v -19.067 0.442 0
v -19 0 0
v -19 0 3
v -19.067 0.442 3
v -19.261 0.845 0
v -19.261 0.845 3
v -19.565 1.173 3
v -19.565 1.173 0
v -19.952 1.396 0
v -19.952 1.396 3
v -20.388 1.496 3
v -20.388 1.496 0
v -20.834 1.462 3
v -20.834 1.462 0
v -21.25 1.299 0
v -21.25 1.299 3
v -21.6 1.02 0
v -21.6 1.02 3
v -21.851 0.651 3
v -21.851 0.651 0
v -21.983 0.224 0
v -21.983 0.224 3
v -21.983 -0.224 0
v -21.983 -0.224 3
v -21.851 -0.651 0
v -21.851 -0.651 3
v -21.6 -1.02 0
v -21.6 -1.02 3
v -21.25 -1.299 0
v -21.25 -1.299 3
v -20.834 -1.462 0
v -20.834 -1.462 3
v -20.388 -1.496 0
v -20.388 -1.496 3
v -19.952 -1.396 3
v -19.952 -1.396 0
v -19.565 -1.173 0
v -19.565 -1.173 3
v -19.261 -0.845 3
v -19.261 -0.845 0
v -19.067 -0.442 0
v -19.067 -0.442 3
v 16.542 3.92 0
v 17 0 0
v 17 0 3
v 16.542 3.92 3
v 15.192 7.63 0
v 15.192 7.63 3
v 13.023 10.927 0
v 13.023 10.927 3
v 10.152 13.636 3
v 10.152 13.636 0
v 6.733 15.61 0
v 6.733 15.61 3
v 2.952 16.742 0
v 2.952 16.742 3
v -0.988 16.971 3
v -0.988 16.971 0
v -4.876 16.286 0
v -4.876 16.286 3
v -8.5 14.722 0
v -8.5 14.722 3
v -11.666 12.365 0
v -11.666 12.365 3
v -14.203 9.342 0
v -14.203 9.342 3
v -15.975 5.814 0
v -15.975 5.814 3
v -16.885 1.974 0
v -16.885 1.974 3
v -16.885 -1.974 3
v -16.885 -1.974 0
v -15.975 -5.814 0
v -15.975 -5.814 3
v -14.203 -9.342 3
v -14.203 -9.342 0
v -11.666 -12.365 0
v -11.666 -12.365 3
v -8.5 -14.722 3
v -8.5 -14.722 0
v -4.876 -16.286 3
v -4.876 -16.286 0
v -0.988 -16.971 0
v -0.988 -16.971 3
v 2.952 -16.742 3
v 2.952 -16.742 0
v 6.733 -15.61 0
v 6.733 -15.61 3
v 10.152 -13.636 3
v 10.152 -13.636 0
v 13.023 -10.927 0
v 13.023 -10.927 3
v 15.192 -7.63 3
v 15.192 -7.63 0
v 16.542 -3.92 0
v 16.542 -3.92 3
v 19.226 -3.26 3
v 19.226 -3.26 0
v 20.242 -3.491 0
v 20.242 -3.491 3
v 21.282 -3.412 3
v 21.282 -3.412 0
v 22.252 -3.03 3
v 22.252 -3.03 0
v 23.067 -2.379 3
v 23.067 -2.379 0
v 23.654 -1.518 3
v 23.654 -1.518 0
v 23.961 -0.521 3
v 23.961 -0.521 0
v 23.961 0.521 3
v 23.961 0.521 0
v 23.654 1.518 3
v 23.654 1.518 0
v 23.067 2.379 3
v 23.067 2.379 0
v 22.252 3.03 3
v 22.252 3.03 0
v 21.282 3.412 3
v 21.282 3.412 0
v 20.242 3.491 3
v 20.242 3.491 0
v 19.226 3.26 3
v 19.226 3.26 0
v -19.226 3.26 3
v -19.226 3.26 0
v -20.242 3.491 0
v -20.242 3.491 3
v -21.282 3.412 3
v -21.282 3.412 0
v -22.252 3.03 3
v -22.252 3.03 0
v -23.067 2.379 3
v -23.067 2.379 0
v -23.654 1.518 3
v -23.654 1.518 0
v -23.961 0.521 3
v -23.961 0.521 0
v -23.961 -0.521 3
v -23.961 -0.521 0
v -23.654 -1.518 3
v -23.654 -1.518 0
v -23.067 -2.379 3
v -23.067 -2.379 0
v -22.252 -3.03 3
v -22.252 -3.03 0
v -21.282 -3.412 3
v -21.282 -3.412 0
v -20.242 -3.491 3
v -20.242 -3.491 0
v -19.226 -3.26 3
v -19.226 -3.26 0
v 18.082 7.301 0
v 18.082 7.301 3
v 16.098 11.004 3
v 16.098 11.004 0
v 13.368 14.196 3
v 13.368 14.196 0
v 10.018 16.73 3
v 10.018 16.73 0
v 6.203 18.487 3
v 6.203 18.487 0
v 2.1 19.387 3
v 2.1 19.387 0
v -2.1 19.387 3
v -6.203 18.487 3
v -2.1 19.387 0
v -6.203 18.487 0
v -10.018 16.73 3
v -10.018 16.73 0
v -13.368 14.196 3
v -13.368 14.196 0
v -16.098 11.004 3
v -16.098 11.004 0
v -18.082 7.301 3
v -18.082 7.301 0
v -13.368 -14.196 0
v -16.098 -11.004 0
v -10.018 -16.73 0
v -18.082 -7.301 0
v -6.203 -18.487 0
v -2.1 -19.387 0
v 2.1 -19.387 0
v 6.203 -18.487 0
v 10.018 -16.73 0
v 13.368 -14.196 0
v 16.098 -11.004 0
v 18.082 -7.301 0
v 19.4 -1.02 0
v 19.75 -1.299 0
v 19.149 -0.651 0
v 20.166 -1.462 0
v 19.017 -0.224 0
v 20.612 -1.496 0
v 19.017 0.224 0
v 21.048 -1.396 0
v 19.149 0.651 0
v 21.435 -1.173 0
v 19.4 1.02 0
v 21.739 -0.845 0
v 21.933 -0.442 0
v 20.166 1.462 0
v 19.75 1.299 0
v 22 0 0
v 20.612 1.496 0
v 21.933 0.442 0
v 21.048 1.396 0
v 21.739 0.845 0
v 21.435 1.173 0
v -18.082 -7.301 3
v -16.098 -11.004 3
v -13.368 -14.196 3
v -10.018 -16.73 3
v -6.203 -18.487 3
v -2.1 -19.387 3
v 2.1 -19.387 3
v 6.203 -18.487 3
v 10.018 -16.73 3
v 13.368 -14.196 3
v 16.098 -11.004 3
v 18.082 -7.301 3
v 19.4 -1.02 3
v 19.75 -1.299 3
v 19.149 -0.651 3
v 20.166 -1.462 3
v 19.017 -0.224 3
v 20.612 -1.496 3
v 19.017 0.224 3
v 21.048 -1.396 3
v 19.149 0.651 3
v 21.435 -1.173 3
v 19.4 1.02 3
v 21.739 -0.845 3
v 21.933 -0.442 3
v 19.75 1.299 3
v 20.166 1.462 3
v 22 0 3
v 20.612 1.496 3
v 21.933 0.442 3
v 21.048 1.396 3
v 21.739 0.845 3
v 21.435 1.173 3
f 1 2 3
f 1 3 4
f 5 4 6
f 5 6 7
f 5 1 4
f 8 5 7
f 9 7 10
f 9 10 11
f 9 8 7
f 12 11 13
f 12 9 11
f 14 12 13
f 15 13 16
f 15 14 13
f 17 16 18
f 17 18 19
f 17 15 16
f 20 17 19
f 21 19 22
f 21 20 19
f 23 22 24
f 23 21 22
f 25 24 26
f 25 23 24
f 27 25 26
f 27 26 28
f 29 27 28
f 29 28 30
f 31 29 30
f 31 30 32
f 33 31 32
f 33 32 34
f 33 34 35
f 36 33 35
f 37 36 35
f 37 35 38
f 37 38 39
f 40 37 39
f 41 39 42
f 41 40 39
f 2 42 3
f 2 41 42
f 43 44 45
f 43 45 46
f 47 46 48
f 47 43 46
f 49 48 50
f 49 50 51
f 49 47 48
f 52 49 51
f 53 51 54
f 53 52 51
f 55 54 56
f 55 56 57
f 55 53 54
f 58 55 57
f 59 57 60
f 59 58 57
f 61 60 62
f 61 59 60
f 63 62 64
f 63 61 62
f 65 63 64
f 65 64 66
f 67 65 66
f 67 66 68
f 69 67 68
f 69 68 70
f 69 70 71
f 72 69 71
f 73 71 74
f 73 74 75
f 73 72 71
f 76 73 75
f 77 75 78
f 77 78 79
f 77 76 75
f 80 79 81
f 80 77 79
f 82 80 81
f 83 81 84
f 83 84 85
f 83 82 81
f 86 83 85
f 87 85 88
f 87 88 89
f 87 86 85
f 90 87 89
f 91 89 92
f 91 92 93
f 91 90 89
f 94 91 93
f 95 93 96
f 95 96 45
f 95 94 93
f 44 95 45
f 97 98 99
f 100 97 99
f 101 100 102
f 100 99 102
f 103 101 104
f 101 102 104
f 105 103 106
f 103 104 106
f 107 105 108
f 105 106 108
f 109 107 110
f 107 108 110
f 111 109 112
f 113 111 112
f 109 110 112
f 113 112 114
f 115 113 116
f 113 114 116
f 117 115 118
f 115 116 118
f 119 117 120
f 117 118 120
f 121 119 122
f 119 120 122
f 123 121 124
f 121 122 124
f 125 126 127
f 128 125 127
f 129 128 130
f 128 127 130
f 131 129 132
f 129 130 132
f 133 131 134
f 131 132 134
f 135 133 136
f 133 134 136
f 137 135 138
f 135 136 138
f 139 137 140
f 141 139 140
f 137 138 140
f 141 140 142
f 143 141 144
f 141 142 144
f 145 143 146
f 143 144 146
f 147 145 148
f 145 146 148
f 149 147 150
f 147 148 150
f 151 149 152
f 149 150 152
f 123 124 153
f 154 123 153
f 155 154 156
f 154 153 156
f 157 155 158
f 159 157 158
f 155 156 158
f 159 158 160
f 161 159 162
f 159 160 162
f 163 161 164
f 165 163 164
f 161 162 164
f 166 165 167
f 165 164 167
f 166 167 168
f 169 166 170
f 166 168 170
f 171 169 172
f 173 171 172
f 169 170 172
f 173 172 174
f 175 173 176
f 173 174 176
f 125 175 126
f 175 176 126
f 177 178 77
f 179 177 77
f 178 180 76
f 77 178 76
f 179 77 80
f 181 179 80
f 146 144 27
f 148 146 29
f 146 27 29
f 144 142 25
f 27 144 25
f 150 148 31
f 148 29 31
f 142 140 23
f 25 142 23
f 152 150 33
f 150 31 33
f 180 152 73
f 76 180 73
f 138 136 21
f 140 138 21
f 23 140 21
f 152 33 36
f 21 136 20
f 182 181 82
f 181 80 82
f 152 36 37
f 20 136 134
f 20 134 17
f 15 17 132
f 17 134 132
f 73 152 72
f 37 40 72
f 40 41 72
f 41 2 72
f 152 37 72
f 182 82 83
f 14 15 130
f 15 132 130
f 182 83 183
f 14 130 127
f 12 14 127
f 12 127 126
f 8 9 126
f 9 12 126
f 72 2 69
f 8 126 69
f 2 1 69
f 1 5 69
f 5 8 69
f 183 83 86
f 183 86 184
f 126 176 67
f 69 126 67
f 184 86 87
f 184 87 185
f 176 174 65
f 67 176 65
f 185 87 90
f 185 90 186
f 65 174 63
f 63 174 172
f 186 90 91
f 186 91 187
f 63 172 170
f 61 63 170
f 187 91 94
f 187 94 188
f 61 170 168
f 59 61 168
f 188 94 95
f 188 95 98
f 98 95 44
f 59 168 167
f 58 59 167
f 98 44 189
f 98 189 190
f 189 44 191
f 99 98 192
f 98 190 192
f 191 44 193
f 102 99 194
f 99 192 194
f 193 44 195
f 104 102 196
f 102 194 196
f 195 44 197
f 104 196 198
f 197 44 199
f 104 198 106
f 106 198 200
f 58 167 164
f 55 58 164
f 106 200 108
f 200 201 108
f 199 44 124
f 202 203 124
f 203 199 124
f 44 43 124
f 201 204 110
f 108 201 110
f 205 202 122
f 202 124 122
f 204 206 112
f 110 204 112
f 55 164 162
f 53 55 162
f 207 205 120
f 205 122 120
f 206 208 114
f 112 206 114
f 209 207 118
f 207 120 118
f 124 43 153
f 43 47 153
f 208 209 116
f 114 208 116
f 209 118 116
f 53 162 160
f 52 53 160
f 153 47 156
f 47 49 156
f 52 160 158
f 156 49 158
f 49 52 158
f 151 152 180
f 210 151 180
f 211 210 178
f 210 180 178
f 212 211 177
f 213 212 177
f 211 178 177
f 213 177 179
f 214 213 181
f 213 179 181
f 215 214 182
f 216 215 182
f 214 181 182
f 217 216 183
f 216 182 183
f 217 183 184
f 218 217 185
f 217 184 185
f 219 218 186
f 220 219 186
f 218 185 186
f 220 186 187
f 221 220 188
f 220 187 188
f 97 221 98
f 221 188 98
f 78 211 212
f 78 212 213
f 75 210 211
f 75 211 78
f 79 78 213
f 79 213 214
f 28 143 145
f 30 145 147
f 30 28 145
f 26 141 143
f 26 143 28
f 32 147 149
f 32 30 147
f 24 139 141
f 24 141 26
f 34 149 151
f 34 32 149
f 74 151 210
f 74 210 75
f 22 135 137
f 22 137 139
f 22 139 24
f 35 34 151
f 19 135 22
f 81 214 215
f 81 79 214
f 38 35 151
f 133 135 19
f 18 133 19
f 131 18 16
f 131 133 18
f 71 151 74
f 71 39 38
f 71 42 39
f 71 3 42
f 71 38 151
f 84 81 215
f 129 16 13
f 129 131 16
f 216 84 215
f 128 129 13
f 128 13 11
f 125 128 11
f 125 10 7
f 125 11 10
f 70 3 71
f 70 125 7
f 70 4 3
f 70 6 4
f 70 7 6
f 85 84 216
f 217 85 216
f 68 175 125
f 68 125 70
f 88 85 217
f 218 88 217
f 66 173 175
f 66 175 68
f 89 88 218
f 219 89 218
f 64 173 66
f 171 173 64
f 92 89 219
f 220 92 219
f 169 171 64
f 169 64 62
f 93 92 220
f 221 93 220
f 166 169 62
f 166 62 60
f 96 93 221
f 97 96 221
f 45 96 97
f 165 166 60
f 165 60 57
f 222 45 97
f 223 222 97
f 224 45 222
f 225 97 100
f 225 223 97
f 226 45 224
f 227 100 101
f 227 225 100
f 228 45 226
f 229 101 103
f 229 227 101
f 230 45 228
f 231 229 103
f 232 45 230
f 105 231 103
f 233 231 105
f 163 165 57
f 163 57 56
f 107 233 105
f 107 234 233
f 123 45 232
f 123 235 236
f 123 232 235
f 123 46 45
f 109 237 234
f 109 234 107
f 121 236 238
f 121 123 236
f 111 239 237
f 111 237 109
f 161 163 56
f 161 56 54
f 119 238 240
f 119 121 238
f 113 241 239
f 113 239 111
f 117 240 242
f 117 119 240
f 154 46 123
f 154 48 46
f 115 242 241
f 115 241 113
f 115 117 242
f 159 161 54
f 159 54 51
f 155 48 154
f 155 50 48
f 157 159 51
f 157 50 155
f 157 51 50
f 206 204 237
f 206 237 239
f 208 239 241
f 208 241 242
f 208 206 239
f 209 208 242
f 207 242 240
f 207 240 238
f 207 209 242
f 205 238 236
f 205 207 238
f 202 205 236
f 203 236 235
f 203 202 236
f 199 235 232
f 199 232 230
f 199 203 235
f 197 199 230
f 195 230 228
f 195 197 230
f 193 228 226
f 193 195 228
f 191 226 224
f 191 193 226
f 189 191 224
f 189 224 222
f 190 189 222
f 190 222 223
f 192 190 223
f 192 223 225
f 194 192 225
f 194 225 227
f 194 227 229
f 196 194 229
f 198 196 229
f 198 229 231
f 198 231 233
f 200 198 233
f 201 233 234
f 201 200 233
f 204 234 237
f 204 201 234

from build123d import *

# Parameters (mm, degrees)
SKETCH_R   = 17
SKETCH_R_2 = 1.5
PAD_DEPTH  = 3


with BuildPart() as part:
    # Sketch → Pad (new body)
    with BuildSketch(Plane.XY):
        with BuildLine():
            ThreePointArc((19.22561, 3.259744), (0, 19.5), (-19.22561, 3.259744))
            ThreePointArc((-19.22561, 3.259744), (-24, 0), (-19.22561, -3.259744))
            ThreePointArc((-19.22561, -3.259744), (0, -19.5), (19.22561, -3.259744))
            ThreePointArc((19.22561, -3.259744), (24, 0), (19.22561, 3.259744))
        make_face()
        Circle(SKETCH_R, mode=Mode.SUBTRACT)
        with Locations((20.5, 0)):
            Circle(SKETCH_R_2, mode=Mode.SUBTRACT)
        with Locations((-20.5, 0)):
            Circle(SKETCH_R_2, mode=Mode.SUBTRACT)
    extrude(amount=PAD_DEPTH)


solid = part.part
